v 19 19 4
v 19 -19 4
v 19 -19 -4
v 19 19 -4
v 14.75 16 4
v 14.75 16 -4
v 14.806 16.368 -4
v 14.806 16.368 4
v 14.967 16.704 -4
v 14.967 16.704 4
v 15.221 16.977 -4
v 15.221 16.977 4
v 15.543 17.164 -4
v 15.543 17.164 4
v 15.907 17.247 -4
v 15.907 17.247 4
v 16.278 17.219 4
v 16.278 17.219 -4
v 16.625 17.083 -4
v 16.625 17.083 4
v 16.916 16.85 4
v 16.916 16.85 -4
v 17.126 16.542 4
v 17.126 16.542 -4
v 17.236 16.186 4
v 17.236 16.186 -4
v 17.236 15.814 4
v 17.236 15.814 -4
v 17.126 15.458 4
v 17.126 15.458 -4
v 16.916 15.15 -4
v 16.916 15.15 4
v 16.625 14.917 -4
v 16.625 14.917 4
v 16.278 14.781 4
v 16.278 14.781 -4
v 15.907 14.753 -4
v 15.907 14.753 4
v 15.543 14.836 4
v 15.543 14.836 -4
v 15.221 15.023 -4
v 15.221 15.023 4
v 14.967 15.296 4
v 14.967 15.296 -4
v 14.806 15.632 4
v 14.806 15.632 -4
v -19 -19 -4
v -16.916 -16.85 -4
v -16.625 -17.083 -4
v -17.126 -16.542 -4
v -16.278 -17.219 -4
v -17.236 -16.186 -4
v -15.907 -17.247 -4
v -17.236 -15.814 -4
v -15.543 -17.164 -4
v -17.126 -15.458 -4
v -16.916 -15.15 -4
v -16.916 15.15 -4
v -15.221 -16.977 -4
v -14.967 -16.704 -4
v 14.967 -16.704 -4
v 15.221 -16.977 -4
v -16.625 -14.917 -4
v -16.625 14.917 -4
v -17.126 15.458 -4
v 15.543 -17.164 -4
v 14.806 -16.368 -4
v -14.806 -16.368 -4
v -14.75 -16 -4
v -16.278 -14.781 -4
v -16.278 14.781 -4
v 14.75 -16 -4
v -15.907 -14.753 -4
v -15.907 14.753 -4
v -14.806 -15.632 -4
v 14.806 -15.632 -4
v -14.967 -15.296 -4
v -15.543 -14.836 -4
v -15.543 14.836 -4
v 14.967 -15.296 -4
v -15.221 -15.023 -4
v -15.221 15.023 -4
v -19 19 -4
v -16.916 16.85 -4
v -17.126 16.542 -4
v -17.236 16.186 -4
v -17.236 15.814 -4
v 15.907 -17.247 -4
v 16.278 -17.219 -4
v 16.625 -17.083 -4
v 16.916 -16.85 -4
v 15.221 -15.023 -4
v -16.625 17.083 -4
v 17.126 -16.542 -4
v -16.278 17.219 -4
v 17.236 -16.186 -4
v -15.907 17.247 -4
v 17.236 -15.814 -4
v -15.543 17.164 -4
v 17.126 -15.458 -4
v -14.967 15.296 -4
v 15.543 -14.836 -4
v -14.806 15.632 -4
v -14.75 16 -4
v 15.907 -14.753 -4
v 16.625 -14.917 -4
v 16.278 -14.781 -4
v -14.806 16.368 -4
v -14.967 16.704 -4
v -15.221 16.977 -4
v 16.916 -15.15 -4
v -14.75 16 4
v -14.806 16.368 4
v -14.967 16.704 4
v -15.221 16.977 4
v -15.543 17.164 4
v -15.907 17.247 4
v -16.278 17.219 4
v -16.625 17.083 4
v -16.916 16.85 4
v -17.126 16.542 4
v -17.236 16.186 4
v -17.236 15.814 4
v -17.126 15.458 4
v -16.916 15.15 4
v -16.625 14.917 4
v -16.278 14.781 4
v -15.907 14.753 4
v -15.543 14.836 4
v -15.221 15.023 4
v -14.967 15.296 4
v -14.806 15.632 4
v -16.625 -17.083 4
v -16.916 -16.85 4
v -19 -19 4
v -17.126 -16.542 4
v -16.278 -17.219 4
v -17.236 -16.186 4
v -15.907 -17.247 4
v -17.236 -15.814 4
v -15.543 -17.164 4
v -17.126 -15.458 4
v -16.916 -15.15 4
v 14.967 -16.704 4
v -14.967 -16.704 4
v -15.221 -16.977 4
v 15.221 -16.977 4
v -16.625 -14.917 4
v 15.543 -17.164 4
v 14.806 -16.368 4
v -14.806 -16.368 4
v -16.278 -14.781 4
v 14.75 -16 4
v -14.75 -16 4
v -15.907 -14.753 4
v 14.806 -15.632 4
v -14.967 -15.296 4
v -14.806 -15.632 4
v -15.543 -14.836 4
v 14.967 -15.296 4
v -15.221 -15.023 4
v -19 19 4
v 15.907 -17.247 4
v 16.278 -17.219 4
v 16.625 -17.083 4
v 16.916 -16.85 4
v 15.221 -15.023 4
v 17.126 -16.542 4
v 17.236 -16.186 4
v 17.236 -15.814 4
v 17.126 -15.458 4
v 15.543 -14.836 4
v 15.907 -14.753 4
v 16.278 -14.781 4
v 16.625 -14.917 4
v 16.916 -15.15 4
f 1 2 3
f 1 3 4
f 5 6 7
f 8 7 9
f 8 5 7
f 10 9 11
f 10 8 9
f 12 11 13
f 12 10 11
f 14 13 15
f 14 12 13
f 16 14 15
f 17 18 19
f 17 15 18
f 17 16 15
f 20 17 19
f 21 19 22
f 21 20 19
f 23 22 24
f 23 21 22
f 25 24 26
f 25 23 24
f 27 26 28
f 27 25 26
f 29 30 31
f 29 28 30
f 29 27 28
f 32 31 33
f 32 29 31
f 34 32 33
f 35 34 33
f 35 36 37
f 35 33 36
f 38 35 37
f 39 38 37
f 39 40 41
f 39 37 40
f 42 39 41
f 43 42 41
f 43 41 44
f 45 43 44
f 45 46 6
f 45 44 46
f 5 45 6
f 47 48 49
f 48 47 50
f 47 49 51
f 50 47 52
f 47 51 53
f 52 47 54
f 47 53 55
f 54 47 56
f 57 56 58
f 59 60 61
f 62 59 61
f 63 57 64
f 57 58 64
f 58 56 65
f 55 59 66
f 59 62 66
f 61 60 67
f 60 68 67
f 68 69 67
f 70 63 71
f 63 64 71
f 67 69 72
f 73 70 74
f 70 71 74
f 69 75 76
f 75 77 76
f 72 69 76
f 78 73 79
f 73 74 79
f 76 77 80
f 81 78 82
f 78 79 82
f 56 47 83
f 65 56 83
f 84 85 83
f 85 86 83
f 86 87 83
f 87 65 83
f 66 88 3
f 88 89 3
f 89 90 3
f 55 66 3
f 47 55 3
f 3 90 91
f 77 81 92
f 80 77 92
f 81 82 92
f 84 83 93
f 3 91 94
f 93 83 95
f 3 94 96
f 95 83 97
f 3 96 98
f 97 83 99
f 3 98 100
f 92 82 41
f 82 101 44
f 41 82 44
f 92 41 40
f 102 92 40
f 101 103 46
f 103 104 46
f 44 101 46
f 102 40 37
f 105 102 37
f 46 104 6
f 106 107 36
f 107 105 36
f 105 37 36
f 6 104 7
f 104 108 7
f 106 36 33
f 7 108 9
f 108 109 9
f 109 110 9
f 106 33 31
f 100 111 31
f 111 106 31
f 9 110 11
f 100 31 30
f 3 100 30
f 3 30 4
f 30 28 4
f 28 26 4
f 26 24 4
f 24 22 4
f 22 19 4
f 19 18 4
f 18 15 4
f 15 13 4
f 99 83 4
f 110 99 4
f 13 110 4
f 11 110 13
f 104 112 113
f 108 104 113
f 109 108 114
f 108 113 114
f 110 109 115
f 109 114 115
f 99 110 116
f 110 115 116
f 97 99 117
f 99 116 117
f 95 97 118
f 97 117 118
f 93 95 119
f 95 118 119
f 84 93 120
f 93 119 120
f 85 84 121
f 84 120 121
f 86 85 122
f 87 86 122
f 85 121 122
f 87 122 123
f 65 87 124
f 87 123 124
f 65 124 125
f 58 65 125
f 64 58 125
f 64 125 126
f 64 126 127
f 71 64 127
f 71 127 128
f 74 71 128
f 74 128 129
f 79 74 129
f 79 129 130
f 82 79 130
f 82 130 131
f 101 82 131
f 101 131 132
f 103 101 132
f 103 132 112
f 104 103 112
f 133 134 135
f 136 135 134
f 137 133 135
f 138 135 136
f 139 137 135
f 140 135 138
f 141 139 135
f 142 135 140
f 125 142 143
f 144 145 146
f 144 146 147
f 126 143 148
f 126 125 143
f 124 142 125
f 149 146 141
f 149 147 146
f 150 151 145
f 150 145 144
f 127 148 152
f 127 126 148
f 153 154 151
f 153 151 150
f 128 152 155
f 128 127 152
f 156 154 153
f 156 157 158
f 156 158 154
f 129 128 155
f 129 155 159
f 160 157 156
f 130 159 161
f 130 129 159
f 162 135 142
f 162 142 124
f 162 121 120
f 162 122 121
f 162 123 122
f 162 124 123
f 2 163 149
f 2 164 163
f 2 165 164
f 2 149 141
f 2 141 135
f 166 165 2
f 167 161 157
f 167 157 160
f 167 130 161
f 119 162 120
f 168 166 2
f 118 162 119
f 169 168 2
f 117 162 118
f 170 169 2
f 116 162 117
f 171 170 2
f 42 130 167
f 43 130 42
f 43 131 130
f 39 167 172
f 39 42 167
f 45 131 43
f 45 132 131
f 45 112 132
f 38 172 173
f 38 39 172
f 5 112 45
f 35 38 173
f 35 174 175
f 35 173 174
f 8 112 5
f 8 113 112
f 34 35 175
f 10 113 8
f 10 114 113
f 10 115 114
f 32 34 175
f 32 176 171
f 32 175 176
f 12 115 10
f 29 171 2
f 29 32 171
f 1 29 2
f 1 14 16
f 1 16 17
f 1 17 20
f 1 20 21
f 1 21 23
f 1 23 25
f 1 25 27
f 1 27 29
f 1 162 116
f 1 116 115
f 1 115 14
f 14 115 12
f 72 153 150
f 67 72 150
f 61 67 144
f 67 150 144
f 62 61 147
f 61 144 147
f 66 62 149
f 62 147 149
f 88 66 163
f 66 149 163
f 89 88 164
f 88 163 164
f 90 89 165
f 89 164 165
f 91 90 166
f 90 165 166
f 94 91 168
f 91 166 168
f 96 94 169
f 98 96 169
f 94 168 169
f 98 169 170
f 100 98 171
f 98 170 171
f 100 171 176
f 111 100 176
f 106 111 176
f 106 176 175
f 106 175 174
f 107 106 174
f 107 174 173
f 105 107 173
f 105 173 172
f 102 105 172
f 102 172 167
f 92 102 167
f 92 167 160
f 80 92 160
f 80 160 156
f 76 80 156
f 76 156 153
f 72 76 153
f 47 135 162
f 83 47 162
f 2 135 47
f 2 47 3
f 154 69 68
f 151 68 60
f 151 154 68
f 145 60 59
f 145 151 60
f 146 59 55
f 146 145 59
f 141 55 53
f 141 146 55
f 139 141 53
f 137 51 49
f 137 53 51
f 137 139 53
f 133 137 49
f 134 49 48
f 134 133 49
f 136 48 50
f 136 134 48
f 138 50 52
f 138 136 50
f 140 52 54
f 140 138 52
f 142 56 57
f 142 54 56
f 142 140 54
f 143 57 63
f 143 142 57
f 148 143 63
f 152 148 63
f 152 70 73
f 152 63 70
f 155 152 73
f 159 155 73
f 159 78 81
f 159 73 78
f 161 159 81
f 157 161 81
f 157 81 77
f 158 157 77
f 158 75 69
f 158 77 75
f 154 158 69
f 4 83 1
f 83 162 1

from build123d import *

# Parameters (mm, degrees)
SKETCH1_W               = 38
SKETCH1_H               = 38
BOSS_EXTRUDE1_DEPTH     = 4
SKETCH2_R               = 1.25
CUT_EXTRUDE1_DEPTH      = 9
MIRROR2_COPY_1_SKETCH_R = 1.25
MIRROR2_COPY_1_DEPTH    = 9


with BuildPart() as part:
    # Sketch1 → Boss-Extrude1 (new body, symmetric)
    with BuildSketch(Plane.XY):
        Rectangle(SKETCH1_W, SKETCH1_H)
    extrude(amount=BOSS_EXTRUDE1_DEPTH, both=True)

    # Sketch2 → Cut-Extrude1 (cut, through all)
    with BuildSketch(Plane.XY.offset(4)):
        with Locations((-16, 16)):
            Circle(SKETCH2_R)
    cut_extrude1 = extrude(amount=-CUT_EXTRUDE1_DEPTH, mode=Mode.SUBTRACT)

    # Mirror1: Cut-Extrude1 across plane
    add(cut_extrude1.mirror(Plane.ZX), mode=Mode.SUBTRACT)

    # Mirror2: Cut-Extrude1 across plane
    add(cut_extrude1.mirror(Plane(origin=(0, 0, 0), x_dir=(0, 0, 1), z_dir=(1, 0, 0))), mode=Mode.SUBTRACT)

    # Mirror2 copy 1 sketch → Mirror2 copy 1 (cut, through all)
    with BuildSketch(Plane(origin=(0, 0, 4), x_dir=(-1, 0, 0), z_dir=(0, 0, 1))):
        with Locations((-16, 16)):
            Circle(MIRROR2_COPY_1_SKETCH_R)
    extrude(amount=-MIRROR2_COPY_1_DEPTH, mode=Mode.SUBTRACT)


solid = part.part
